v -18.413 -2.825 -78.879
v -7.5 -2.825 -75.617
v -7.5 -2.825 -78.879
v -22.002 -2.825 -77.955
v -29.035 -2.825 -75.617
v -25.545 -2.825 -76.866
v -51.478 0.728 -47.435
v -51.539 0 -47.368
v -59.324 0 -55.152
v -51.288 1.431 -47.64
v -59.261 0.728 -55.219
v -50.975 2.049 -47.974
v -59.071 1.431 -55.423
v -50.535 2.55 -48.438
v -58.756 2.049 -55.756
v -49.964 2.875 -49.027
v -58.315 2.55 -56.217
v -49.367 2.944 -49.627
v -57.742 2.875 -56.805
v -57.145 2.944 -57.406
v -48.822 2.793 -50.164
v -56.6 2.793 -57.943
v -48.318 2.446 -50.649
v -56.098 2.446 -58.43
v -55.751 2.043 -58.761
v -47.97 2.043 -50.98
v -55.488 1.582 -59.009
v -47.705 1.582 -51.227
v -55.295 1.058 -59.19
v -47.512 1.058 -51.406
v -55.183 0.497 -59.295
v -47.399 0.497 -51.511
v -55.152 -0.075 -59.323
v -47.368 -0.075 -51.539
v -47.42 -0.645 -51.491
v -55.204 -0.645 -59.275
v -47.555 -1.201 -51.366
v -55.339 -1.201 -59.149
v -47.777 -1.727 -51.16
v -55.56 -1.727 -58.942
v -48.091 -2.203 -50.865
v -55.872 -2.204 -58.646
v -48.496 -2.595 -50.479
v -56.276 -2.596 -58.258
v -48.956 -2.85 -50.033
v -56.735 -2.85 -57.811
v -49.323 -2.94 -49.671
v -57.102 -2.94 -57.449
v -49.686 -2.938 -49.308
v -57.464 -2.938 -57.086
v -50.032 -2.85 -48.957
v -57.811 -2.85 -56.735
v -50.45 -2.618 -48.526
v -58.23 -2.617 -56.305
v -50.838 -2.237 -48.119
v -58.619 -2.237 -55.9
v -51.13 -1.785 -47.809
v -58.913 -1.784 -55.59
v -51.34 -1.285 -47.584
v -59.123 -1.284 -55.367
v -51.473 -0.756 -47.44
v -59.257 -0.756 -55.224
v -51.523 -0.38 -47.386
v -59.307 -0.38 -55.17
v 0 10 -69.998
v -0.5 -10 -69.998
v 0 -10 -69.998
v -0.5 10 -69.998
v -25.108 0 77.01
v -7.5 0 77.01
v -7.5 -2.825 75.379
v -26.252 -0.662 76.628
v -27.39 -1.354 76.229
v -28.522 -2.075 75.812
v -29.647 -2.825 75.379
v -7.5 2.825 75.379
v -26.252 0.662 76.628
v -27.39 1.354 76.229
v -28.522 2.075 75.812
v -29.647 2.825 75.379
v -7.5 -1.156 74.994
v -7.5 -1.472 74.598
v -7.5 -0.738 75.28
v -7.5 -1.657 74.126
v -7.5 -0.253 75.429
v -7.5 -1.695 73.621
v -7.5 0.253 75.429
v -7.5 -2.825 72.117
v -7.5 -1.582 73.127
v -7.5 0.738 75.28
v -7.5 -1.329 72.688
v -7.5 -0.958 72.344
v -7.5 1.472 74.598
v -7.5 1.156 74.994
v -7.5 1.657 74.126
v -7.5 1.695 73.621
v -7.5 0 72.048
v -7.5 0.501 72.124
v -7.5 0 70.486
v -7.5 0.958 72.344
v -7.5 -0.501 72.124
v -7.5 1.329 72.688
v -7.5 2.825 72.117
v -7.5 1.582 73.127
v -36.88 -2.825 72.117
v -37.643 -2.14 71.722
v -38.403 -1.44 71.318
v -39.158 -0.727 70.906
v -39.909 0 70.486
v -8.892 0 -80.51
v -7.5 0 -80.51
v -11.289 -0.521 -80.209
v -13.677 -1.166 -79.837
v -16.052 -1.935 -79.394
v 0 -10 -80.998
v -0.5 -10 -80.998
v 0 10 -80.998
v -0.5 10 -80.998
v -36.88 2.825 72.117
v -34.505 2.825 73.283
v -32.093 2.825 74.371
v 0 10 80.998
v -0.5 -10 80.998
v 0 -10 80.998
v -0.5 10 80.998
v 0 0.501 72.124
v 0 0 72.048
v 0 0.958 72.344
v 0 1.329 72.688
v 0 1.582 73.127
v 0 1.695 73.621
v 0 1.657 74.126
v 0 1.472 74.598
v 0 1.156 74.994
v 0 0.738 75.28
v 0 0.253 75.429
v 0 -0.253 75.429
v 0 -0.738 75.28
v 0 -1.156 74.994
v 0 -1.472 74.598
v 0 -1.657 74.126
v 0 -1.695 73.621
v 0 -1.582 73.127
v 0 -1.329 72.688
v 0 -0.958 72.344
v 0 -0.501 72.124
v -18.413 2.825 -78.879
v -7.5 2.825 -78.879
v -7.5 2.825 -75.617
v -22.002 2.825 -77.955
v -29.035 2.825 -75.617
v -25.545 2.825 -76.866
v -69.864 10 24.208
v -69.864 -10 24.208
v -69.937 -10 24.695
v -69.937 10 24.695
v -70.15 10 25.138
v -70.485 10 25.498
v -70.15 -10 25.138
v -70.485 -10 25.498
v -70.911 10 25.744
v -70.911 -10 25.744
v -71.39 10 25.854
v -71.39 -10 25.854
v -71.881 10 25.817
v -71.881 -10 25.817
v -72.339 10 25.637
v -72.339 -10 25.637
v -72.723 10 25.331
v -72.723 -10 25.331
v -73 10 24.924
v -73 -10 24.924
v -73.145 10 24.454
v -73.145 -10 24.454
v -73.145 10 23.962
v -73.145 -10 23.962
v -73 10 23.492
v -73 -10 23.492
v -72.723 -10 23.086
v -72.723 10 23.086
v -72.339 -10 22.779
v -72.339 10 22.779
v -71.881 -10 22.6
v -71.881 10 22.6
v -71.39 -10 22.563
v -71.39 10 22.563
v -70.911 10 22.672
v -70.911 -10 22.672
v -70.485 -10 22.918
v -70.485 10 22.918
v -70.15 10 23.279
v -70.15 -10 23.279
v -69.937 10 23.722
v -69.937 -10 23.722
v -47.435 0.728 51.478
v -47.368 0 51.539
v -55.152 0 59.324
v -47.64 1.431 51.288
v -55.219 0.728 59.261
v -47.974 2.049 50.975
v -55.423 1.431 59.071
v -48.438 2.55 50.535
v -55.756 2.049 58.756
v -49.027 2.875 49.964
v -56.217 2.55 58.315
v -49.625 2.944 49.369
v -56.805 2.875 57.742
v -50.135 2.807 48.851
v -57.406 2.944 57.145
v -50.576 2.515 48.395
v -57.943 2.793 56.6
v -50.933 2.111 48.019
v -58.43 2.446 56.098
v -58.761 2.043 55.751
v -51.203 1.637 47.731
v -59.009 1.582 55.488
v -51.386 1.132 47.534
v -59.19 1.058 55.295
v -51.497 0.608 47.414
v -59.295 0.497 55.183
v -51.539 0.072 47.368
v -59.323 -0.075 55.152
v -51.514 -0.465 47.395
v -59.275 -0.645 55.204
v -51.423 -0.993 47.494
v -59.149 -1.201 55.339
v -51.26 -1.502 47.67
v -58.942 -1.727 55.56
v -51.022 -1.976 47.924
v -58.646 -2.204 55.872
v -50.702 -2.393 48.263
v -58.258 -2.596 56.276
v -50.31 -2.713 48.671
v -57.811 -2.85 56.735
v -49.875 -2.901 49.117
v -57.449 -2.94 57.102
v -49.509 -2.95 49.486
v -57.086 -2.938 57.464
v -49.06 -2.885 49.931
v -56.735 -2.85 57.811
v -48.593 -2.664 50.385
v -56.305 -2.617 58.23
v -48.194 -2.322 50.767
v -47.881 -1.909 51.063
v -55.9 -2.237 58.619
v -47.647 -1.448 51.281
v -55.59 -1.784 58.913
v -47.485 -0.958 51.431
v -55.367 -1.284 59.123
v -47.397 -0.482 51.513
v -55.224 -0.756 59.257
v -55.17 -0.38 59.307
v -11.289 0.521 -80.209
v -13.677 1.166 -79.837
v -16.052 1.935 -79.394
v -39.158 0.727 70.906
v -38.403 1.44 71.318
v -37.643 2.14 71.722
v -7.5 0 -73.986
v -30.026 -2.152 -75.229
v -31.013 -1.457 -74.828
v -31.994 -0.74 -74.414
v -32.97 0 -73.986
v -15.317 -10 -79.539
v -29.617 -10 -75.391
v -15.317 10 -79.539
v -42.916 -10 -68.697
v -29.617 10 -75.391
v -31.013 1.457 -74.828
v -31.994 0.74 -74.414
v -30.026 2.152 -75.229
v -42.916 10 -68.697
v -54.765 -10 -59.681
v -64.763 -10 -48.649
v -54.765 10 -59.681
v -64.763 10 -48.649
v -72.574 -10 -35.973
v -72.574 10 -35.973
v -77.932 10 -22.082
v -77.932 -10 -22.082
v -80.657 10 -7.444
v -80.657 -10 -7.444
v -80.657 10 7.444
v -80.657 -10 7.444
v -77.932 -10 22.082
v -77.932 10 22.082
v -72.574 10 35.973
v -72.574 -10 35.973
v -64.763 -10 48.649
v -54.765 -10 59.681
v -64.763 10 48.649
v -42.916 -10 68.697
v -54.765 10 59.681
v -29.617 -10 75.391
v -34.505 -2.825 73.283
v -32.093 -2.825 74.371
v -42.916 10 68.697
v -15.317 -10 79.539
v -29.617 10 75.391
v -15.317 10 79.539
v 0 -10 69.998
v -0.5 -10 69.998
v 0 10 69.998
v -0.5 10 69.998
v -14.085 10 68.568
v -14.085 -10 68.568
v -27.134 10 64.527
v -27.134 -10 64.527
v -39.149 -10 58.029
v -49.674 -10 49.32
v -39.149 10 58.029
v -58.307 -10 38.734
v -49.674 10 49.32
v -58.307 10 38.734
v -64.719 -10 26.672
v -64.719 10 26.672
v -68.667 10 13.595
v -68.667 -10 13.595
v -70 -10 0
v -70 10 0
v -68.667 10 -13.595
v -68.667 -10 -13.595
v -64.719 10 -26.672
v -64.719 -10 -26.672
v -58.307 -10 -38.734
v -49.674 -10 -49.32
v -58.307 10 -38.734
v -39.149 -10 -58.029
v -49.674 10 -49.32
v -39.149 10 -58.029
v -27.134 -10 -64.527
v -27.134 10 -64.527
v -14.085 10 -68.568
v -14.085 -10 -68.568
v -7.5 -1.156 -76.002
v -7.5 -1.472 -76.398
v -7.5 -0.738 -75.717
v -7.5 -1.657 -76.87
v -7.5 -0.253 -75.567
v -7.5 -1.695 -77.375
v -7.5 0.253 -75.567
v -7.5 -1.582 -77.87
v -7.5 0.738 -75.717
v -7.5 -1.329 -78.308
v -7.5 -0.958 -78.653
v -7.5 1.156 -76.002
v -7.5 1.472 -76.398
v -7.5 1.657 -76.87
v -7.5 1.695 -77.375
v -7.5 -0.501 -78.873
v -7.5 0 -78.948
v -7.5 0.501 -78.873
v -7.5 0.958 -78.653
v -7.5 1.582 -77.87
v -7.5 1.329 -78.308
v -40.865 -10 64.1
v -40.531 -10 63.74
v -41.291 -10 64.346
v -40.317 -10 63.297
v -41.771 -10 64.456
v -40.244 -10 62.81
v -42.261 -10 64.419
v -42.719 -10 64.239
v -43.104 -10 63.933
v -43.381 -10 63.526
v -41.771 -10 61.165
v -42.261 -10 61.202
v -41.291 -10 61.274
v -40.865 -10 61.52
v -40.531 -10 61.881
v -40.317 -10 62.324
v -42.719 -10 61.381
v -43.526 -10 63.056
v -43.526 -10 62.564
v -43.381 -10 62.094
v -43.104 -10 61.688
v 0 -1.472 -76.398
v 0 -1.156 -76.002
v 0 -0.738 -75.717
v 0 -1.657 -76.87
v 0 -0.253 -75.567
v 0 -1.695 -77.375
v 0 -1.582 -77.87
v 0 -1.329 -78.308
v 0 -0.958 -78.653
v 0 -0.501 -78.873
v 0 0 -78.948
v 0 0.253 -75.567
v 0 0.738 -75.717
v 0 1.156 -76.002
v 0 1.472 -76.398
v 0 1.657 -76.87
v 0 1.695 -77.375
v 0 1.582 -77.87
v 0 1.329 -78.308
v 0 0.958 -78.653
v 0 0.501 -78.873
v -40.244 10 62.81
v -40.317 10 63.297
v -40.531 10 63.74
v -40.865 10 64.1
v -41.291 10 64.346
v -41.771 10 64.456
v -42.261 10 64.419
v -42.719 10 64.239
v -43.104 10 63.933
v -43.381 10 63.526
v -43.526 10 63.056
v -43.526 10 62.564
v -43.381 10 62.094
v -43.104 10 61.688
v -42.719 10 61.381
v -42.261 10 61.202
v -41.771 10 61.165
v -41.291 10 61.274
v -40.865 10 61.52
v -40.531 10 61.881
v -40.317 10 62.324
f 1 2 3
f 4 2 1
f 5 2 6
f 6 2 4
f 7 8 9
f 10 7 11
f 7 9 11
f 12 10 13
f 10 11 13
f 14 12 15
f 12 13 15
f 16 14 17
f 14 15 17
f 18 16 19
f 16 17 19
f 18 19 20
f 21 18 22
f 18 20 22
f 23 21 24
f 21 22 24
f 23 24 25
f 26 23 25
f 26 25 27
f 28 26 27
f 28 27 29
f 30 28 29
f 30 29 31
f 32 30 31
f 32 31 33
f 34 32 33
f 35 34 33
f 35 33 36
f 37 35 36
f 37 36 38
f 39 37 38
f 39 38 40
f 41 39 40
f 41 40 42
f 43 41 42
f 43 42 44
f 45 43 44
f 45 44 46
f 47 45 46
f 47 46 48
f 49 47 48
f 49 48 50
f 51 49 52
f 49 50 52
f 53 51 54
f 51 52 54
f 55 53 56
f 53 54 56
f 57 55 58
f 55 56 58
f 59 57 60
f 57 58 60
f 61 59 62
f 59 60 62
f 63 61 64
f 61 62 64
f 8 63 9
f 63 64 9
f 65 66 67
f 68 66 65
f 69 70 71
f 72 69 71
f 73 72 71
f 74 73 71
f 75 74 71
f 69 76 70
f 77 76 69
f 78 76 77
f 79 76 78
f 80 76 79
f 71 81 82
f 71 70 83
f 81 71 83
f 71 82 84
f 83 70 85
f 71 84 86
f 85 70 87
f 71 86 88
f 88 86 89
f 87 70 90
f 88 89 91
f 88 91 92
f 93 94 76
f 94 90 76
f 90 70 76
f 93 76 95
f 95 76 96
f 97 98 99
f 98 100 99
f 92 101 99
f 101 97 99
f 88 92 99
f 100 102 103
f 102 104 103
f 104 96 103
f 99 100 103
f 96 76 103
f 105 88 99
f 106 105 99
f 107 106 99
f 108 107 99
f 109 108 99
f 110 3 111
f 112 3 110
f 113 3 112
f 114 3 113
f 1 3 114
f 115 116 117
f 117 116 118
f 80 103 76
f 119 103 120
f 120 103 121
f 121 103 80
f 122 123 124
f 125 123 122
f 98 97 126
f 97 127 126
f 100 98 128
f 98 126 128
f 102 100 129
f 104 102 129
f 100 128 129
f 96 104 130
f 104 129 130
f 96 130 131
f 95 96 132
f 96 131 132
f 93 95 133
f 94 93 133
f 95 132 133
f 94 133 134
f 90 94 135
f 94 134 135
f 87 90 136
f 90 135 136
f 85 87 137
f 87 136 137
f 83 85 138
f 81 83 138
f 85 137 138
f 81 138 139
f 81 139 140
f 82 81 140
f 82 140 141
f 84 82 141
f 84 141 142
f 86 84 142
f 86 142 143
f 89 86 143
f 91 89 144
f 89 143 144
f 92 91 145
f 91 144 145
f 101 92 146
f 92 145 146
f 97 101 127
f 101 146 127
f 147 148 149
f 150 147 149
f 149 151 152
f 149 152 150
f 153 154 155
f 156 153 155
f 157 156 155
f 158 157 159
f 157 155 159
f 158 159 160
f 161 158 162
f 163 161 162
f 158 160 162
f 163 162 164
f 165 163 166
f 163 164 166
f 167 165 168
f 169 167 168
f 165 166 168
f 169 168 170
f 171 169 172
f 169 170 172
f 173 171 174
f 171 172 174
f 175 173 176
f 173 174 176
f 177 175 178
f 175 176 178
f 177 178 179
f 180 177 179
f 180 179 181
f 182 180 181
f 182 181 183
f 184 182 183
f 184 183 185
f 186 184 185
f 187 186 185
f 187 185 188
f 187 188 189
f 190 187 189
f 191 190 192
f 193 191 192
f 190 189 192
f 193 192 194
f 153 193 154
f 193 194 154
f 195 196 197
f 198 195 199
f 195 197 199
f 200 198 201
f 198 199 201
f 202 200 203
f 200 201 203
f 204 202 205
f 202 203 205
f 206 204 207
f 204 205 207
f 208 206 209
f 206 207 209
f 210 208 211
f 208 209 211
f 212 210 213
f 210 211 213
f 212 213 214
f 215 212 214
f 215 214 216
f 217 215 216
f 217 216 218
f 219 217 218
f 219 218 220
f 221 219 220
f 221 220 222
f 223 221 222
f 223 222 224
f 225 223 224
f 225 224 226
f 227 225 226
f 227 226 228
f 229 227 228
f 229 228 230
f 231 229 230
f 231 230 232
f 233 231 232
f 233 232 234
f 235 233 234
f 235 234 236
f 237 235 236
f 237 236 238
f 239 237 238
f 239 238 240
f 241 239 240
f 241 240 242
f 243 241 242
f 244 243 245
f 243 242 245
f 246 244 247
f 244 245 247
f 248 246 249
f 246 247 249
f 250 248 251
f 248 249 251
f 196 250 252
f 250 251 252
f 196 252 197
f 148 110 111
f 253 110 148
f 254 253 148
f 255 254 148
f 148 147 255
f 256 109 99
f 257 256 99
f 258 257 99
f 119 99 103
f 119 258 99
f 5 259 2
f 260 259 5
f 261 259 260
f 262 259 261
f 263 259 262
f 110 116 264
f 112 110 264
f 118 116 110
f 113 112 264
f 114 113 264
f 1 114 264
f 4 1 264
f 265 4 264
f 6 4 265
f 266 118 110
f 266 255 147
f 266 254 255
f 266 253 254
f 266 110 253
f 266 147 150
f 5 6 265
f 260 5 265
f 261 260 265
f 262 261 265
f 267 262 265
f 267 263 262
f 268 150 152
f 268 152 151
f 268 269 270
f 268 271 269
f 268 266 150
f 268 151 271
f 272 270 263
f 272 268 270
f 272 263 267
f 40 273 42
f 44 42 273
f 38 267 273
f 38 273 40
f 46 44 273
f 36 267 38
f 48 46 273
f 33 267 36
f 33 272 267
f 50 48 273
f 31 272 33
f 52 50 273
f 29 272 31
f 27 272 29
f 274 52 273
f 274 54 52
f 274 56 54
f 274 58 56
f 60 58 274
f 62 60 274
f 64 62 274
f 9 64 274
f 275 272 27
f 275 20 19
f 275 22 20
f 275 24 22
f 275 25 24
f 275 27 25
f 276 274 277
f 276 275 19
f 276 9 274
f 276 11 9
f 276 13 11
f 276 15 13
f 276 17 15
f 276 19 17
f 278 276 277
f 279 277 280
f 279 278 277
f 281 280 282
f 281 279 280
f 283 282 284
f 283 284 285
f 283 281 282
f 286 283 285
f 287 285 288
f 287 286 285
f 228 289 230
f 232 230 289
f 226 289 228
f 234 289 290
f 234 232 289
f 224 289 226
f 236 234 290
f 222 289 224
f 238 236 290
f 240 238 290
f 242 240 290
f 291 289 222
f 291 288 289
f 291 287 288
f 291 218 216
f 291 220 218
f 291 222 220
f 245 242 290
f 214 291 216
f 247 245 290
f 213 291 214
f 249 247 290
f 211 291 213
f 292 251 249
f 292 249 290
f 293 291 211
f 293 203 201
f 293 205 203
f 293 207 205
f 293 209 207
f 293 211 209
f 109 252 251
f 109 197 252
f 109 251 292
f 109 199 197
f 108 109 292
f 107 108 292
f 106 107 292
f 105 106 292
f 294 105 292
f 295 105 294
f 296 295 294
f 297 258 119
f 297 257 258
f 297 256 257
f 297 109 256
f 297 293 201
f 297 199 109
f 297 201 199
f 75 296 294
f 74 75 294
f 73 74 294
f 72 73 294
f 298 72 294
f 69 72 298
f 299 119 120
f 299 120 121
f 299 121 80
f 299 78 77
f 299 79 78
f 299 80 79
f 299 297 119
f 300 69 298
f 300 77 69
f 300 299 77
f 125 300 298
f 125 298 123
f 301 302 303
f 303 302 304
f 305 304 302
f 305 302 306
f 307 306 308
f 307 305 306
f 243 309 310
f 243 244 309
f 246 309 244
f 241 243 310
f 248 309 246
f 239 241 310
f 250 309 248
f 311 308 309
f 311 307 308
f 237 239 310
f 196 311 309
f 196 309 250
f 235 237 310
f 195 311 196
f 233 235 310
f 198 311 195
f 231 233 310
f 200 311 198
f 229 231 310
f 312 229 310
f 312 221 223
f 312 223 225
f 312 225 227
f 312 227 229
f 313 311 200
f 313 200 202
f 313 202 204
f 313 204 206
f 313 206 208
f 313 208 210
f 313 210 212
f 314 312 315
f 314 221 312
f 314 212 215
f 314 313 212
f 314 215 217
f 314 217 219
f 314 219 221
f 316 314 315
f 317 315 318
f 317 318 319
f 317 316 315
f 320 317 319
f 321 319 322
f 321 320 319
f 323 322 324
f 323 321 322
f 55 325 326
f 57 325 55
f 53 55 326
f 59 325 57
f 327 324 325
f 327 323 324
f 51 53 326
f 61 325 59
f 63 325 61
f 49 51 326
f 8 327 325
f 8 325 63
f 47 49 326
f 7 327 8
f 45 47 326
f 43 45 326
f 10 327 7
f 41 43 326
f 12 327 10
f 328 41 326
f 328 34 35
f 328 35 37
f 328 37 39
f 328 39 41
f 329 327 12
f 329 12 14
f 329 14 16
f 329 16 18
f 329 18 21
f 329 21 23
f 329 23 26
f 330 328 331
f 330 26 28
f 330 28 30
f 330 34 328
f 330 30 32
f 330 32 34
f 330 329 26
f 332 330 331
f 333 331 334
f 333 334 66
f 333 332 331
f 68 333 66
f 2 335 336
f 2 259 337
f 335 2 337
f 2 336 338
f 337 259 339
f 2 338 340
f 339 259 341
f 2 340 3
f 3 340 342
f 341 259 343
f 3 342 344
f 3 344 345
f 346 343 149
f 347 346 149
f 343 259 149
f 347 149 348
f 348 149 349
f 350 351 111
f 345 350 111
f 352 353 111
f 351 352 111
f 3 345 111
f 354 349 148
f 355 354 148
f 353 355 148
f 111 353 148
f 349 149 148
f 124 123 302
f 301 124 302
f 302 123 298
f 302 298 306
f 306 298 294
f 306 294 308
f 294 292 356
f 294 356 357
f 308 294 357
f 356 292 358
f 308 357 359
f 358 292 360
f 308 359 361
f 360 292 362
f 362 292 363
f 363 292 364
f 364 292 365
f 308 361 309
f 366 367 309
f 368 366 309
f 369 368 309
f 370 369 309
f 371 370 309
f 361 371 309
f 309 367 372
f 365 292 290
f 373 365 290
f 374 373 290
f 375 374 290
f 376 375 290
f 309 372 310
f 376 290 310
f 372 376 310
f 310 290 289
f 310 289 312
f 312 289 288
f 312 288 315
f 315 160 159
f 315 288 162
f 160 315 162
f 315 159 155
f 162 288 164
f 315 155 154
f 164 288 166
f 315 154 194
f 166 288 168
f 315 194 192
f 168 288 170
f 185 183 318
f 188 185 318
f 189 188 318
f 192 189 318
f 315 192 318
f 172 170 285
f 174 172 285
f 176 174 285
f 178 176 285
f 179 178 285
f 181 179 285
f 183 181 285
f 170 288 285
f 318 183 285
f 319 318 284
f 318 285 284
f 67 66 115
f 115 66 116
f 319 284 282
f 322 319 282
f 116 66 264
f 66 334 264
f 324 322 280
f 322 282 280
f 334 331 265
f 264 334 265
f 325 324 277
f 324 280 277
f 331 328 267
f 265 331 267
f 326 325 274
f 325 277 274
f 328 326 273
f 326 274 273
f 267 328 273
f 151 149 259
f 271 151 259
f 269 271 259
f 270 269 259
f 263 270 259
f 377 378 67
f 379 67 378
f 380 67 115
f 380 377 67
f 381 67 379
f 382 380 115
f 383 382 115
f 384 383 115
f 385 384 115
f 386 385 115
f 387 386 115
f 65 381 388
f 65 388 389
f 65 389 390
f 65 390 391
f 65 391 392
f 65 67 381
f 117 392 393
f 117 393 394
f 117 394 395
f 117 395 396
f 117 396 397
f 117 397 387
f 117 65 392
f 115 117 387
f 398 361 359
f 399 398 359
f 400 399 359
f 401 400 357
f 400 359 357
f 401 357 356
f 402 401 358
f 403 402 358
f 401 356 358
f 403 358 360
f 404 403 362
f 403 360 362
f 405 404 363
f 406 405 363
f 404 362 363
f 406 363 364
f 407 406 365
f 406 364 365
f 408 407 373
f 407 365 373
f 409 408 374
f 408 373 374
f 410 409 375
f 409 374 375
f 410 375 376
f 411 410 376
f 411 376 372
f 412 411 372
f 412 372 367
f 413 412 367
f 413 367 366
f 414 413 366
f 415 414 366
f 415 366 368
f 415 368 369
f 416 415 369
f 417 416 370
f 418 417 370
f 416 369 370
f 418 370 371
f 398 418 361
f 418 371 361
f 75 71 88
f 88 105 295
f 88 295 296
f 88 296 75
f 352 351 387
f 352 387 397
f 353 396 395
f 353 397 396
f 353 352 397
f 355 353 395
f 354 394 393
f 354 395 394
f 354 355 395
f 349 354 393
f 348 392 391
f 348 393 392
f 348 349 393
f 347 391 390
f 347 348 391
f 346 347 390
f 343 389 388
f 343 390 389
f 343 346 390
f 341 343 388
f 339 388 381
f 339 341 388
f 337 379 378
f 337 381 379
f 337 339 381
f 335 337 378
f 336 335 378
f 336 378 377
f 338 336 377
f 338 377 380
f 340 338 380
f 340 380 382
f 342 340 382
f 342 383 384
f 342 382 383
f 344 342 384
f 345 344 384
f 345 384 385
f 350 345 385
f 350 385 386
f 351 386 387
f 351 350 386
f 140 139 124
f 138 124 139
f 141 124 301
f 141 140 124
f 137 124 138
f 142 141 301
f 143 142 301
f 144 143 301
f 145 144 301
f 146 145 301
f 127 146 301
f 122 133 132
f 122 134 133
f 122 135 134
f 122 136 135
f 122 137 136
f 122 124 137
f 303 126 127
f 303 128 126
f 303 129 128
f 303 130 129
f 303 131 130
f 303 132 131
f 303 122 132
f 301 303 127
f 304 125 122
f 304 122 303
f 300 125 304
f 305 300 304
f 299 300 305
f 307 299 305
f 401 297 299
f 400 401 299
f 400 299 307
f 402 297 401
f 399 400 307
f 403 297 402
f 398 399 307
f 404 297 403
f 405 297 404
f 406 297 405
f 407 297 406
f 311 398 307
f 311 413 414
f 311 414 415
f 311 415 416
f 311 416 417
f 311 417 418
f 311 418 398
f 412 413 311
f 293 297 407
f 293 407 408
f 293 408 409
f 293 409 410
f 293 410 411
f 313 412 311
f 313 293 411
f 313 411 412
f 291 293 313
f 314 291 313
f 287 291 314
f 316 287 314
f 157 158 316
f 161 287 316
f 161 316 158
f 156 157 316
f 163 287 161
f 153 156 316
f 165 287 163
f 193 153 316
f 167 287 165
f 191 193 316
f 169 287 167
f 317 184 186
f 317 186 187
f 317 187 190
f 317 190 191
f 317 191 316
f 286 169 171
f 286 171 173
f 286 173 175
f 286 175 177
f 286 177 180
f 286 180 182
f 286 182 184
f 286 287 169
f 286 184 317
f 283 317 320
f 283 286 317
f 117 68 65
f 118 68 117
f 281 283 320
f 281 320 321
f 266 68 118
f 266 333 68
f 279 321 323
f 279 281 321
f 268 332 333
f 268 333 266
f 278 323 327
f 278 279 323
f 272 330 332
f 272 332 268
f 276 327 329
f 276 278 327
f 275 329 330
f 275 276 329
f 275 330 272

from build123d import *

# Parameters (mm, degrees)
BOSS_EXTRUDE1_DEPTH   = 10
SKETCH2_W             = 162
SKETCH2_H             = 20
CUT_EXTRUDE1_DEPTH    = 0.5
CUT_EXTRUDE2_DEPTH    = 67.5
F_6_0MM_DOWEL_HOLE2_D = 5.9
F_6_0MM_DOWEL_HOLE4_D = 5.9
SKETCH30_R            = 1.65
CUT_EXTRUDE7_DEPTH    = 20
SKETCH31_W            = 11.000242512
SKETCH31_H            = 20
BOSS_EXTRUDE2_DEPTH   = 0.5
SKETCH5_R             = 1.7
CUT_EXTRUDE3_DEPTH    = 115


with BuildPart() as part:
    # Sketch1 → Boss-Extrude1 (new body, symmetric)
    with BuildSketch(Plane(origin=(0, 0, 0), x_dir=(1, 0, 0), z_dir=(0, 1, 0))):
        with BuildLine():
            Line((0, 70), (0, 81))
            ThreePointArc((0, 81), (-81, 0), (0, -81))
            Line((0, -81), (0, -70))
            ThreePointArc((0, -70), (-70, 0), (0, 70))
        make_face()
    extrude(amount=BOSS_EXTRUDE1_DEPTH, both=True)

    # Sketch2 → Cut-Extrude1 (cut)
    with BuildSketch(Plane(origin=(0, 0, 0), x_dir=(0, 0, -1), z_dir=(1, 0, 0))):
        Rectangle(SKETCH2_W, SKETCH2_H)
    extrude(amount=-CUT_EXTRUDE1_DEPTH, mode=Mode.SUBTRACT)

    # Sketch4 → Cut-Extrude2 (cut)
    with BuildSketch(Plane(origin=(-75, 0, 0), x_dir=(0, 0, -1), z_dir=(1, 0, 0))):
        Polygon((-72.117199752, 2.825), (-75.379228773, 2.825), (-77.010243284, 0), (-75.379228773, -2.825), (-72.117199752, -2.825), (-70.486185242, 0), align=None)
        Polygon((80.510485796, 0), (78.879471286, 2.825), (75.617442265, 2.825), (73.986427755, 0), (75.617442265, -2.825), (78.879471286, -2.825), align=None)
    extrude(amount=CUT_EXTRUDE2_DEPTH, mode=Mode.SUBTRACT)

    # Ø6.0mm Dowel Hole2 (through all)
    with Locations(Plane(origin=(0, 0, 0), x_dir=(-0.707106781, 0, -0.707106781), z_dir=(0.707106781, 0, -0.707106781))):
        with Locations((0, 0)):
            Hole(F_6_0MM_DOWEL_HOLE2_D / 2)

    # Ø6.0mm Dowel Hole4 (through all)
    with Locations(Plane(origin=(0, 0, 0), x_dir=(0.707106781, 0, -0.707106781), z_dir=(0.707106781, 0, 0.707106781))):
        with Locations((0, 0)):
            Hole(F_6_0MM_DOWEL_HOLE4_D / 2)

    # Sketch30 → Cut-Extrude7 (cut, symmetric)
    with BuildSketch(Plane.XZ.offset(10)):
        with Locations((-41.894091711, 62.810310298)):
            Circle(SKETCH30_R)
        with Locations((-71.513705419, 24.208261757)):
            Circle(SKETCH30_R)
    extrude(amount=CUT_EXTRUDE7_DEPTH, both=True, mode=Mode.SUBTRACT)

    # Sketch31 → Boss-Extrude2 (add)
    with BuildSketch(Plane(origin=(-0.5, 0, 0), x_dir=(0, 0, -1), z_dir=(1, 0, 0))):
        with Locations((-75.498335519, 0)):
            Rectangle(SKETCH31_W, SKETCH31_H)
        with Locations((75.498335519, 0)):
            Rectangle(SKETCH31_W, SKETCH31_H)
    extrude(amount=BOSS_EXTRUDE2_DEPTH)

    # Sketch5 → Cut-Extrude3 (cut, symmetric)
    with BuildSketch(Plane(origin=(-75, 0, 0), x_dir=(0, 0, -1), z_dir=(1, 0, 0))):
        with Locations((77.248456775, 0)):
            Circle(SKETCH5_R)
        with Locations((-73.748214263, 0)):
            Circle(SKETCH5_R)
    extrude(amount=CUT_EXTRUDE3_DEPTH, both=True, mode=Mode.SUBTRACT)


solid = part.part
